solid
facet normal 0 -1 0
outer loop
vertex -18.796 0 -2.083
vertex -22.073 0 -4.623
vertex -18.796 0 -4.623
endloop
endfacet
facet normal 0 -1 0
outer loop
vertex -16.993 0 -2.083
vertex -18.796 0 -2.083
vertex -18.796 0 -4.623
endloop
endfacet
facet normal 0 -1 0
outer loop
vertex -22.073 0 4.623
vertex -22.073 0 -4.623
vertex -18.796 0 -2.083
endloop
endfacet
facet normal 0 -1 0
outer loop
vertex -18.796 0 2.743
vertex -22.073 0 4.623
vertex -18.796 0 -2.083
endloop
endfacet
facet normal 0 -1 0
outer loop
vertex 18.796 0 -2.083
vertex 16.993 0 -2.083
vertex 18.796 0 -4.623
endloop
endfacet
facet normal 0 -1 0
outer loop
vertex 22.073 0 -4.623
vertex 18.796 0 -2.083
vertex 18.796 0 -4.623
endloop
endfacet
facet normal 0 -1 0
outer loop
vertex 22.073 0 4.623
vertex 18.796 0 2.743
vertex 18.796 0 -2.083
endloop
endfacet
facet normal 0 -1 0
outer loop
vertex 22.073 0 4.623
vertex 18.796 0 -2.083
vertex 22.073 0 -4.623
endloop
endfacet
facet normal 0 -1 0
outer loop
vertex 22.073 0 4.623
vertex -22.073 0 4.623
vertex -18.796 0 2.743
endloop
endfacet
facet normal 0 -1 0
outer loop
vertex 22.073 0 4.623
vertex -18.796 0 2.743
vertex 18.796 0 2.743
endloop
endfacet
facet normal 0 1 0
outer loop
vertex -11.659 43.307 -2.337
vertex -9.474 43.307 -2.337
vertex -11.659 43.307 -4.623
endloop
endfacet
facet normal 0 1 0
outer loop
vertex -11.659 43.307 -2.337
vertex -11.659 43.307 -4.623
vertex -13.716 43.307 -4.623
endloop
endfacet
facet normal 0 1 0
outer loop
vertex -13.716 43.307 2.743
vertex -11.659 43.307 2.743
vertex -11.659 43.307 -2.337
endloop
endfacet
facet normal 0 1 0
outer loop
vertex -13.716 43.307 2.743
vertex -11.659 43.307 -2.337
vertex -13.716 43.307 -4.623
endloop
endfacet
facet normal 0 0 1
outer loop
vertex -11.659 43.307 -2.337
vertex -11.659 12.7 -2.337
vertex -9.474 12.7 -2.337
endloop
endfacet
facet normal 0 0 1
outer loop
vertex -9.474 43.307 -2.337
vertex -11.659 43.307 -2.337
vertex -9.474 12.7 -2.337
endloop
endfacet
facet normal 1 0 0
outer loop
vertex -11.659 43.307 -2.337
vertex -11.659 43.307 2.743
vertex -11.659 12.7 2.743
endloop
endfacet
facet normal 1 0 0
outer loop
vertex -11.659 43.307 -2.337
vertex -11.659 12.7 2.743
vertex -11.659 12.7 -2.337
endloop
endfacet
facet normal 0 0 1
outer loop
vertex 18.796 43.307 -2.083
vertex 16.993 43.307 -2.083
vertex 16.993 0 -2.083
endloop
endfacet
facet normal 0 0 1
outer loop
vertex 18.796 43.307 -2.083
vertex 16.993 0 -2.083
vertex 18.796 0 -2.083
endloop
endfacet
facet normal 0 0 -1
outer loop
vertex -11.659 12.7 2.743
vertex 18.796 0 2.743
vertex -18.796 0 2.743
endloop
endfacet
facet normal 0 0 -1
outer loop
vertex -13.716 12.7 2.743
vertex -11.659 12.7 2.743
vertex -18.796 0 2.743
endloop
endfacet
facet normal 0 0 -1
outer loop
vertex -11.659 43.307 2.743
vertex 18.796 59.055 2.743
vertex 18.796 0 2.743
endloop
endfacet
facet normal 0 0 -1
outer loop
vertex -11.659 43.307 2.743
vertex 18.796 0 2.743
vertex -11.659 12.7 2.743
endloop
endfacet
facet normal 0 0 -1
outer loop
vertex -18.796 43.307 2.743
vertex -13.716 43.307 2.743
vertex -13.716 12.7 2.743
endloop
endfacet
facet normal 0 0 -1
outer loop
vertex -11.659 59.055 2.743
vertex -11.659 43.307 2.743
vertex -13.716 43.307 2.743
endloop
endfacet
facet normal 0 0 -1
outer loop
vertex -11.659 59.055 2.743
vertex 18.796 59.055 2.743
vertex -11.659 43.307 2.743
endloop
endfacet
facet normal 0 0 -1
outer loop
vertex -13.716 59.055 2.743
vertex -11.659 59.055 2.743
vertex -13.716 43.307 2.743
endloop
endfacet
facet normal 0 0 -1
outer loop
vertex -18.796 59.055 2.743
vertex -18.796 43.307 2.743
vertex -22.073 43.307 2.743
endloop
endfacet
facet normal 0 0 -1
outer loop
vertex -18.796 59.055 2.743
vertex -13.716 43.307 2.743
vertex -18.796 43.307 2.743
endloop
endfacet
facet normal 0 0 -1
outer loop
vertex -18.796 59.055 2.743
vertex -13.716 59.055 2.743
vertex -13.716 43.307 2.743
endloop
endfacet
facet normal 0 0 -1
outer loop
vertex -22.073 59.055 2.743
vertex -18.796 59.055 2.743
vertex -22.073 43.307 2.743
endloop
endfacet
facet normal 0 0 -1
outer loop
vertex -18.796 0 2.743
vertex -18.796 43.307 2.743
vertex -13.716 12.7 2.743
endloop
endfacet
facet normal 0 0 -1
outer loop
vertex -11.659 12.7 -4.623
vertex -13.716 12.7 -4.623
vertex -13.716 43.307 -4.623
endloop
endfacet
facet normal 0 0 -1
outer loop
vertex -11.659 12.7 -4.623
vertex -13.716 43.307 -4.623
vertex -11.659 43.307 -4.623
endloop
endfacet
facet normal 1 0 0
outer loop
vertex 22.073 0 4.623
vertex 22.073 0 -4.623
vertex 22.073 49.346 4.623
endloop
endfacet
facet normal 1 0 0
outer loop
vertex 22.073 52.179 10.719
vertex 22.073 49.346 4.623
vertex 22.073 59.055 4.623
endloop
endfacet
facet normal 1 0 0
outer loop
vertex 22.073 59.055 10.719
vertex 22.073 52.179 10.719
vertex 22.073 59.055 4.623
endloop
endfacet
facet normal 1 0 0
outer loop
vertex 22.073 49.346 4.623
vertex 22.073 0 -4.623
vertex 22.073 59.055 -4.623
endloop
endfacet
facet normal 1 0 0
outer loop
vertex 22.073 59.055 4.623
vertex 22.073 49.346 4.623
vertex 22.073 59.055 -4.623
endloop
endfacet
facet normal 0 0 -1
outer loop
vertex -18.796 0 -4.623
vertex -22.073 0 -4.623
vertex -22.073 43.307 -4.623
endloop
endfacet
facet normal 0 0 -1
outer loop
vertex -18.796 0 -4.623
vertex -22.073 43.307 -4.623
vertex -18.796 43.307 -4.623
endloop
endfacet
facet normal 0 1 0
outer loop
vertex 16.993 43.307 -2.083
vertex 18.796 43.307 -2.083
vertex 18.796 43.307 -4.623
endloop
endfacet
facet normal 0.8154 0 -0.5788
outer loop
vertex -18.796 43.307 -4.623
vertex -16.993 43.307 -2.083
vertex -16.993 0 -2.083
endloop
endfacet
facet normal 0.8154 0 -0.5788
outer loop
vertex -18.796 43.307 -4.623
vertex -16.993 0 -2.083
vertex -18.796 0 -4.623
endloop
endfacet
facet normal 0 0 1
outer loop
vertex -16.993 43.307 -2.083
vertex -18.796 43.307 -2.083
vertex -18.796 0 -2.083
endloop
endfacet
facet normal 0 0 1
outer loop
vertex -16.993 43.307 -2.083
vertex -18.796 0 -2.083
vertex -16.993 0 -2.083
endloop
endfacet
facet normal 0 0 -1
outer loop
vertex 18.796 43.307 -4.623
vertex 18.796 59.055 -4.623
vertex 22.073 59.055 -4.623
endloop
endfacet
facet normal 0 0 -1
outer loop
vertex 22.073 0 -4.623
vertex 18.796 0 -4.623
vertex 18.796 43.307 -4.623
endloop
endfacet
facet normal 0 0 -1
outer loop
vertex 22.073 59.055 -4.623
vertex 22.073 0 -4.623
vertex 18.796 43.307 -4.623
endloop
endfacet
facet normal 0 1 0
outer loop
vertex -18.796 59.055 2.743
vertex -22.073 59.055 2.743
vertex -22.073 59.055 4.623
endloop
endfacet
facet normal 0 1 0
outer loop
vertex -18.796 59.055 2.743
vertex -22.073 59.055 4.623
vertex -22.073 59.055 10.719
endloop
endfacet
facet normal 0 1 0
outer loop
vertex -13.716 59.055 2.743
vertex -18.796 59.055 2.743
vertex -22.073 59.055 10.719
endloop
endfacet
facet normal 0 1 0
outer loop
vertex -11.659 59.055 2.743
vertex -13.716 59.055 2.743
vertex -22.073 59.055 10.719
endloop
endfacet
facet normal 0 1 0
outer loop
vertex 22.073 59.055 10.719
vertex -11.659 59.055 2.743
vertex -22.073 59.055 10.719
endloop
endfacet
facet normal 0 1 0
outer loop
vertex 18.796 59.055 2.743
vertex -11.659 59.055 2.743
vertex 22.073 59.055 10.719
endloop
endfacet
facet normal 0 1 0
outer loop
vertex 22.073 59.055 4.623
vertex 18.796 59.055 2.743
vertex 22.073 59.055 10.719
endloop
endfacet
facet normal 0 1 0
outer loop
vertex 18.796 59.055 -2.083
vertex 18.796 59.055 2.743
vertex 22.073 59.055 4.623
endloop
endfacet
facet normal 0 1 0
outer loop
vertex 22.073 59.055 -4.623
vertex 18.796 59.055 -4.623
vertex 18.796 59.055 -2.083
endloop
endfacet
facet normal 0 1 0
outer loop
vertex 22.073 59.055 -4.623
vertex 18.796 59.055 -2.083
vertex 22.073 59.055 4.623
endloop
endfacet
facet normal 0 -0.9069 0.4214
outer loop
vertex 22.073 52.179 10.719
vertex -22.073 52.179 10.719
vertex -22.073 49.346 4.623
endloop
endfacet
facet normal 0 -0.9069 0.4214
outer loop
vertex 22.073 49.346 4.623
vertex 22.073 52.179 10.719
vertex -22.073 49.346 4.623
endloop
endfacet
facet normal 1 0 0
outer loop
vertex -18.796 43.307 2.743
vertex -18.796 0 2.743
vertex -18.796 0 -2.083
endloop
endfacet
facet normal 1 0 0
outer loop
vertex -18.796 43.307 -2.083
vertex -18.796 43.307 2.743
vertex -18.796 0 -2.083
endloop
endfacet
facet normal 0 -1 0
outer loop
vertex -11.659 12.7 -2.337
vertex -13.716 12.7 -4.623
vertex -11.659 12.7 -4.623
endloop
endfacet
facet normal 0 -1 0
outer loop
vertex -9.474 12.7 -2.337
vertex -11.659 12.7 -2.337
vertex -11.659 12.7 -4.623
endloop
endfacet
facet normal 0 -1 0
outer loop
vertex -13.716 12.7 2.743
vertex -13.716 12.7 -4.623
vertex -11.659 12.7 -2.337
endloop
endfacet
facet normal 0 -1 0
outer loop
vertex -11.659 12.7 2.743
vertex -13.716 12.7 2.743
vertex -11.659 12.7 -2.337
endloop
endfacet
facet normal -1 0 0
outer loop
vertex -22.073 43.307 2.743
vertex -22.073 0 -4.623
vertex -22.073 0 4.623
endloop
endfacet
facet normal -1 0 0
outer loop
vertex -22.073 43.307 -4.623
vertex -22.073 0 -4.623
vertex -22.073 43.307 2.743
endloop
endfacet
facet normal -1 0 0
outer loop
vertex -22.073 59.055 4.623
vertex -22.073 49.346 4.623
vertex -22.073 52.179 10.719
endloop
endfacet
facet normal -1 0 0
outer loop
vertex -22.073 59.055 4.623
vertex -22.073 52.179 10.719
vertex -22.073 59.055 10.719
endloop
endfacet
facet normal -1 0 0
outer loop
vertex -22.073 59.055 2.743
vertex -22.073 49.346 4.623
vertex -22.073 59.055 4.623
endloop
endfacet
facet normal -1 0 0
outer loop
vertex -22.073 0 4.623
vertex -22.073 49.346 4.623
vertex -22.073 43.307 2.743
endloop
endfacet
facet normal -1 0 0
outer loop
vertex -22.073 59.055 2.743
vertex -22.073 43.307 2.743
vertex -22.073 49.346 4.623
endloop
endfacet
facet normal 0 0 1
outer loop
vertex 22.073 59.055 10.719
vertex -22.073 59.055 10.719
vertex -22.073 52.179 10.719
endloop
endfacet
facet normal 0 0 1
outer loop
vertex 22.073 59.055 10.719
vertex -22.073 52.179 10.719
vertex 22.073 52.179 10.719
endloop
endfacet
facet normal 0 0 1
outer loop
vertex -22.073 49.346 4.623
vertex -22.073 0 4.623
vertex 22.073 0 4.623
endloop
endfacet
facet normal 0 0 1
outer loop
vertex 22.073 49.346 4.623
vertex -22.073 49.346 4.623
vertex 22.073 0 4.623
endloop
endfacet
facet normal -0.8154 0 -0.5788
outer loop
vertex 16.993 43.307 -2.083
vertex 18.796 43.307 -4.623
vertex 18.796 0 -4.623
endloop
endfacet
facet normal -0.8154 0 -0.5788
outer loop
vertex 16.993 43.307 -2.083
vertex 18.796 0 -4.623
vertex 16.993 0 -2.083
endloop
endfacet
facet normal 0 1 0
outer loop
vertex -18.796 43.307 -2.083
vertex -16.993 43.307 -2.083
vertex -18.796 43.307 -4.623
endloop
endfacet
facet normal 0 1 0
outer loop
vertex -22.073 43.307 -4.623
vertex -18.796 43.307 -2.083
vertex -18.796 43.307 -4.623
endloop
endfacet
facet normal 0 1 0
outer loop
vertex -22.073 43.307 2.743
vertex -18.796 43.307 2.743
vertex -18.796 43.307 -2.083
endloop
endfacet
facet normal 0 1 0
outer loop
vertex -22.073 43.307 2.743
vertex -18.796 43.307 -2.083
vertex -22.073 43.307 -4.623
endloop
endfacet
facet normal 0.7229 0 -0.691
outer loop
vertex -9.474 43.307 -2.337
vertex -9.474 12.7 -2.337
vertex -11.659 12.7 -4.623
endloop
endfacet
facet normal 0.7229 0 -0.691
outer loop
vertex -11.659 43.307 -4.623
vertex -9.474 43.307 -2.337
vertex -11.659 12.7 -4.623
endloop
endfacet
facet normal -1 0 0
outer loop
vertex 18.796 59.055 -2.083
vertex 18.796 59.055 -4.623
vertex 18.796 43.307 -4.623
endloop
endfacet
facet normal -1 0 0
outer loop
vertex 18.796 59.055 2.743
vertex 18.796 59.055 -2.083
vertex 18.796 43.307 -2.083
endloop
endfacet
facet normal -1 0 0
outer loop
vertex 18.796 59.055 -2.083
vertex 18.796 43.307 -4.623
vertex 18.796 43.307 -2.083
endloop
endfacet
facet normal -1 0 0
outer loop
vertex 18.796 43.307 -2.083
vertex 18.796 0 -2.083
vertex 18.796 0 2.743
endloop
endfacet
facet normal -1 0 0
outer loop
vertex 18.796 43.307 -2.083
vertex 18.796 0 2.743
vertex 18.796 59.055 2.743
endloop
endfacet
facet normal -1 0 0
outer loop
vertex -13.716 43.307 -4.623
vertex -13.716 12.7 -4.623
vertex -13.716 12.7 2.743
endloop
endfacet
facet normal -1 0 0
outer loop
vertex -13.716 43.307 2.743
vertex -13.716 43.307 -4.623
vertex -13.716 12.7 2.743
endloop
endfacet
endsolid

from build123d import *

# Parameters (mm, degrees)
F0_W      = 44.1452
F0_H      = 9.2456
F1_DEPTH  = 59.055
F2_W      = 44.1452
F2_H      = 9.7089702415
F3_DEPTH  = 6.096
F5_DEPTH  = 81.026
F6_DEPTH  = 82.296
F8_DEPTH  = 67.564
F9_W      = 40.8686
F9_H      = 7.366
F10_DEPTH = 15.748
F11_W     = 6.735065354
F11_H     = 7.366
F12_DEPTH = 12.7


with BuildPart() as f1:
    # F0 (on Front) → F1 (new body)
    with BuildSketch(Plane.XZ):
        Rectangle(F0_W, F0_H)
    extrude(amount=-F1_DEPTH)

    # F2 (on face) → F3 (join)
    with BuildSketch(Plane.XY.offset(4.6228)):
        with Locations((0, 54.2005148792)):
            Rectangle(F2_W, F2_H)
    extrude(amount=F3_DEPTH)

    # F4 (on face) → F5 (cut)
    with BuildSketch(Plane.XZ):
        Polygon((-9.4742, -2.3368), (-11.6586, -4.6228), (18.796, -4.6228), (16.9926, -2.0828), (18.796, -2.0828), (18.796, 2.7432), (-11.6586, 2.7432), (-11.6586, -2.3368), align=None)
    extrude(amount=-F5_DEPTH, mode=Mode.SUBTRACT)

    # F4 (on face) → F6 (cut)
    with BuildSketch(Plane.XZ):
        Polygon((-18.796, -4.6228), (-13.716, -4.6228), (-13.716, 2.7432), (-18.796, 2.7432), (-18.796, -2.0828), (-16.9926, -2.0828), align=None)
        Polygon((-9.4742, -2.3368), (-11.6586, -4.6228), (18.796, -4.6228), (16.9926, -2.0828), (18.796, -2.0828), (18.796, 2.7432), (-11.6586, 2.7432), (-11.6586, -2.3368), align=None)
    extrude(amount=-F6_DEPTH, mode=Mode.SUBTRACT)

    # F7 (on face) → F8 (cut)
    with BuildSketch(Plane(origin=(-22.0726, 0, 0), x_dir=(0, -1, 0), z_dir=(-1, 0, 0))):
        Polygon((-52.1785840392, 10.7188), (-49.3460297585, 4.6228), (-49.3460297585, 10.7188), align=None)
    extrude(amount=-F8_DEPTH, mode=Mode.SUBTRACT)

    # F9 (on face) → F10 (cut)
    with BuildSketch(Plane(origin=(0, 59.055, 0), x_dir=(-1, 0, 0), z_dir=(0, 1, 0))):
        with Locations((1.6383, -0.9398)):
            Rectangle(F9_W, F9_H)
    extrude(amount=-F10_DEPTH, mode=Mode.SUBTRACT)

    # F11 (on face) → F12 (cut)
    with BuildSketch(Plane.XZ):
        with Locations((-10.348467323, -0.9398)):
            Rectangle(F11_W, F11_H)
    extrude(amount=-F12_DEPTH, mode=Mode.SUBTRACT)


with BuildPart() as f13_1:
    # F13: instance of F1
    add(f1.part.mirror(Plane.YZ))


with BuildPart() as f15_1:
    # F15: instance of F13_1
    add(f13_1.part.mirror(Plane.YZ))


solid = f15_1.part
